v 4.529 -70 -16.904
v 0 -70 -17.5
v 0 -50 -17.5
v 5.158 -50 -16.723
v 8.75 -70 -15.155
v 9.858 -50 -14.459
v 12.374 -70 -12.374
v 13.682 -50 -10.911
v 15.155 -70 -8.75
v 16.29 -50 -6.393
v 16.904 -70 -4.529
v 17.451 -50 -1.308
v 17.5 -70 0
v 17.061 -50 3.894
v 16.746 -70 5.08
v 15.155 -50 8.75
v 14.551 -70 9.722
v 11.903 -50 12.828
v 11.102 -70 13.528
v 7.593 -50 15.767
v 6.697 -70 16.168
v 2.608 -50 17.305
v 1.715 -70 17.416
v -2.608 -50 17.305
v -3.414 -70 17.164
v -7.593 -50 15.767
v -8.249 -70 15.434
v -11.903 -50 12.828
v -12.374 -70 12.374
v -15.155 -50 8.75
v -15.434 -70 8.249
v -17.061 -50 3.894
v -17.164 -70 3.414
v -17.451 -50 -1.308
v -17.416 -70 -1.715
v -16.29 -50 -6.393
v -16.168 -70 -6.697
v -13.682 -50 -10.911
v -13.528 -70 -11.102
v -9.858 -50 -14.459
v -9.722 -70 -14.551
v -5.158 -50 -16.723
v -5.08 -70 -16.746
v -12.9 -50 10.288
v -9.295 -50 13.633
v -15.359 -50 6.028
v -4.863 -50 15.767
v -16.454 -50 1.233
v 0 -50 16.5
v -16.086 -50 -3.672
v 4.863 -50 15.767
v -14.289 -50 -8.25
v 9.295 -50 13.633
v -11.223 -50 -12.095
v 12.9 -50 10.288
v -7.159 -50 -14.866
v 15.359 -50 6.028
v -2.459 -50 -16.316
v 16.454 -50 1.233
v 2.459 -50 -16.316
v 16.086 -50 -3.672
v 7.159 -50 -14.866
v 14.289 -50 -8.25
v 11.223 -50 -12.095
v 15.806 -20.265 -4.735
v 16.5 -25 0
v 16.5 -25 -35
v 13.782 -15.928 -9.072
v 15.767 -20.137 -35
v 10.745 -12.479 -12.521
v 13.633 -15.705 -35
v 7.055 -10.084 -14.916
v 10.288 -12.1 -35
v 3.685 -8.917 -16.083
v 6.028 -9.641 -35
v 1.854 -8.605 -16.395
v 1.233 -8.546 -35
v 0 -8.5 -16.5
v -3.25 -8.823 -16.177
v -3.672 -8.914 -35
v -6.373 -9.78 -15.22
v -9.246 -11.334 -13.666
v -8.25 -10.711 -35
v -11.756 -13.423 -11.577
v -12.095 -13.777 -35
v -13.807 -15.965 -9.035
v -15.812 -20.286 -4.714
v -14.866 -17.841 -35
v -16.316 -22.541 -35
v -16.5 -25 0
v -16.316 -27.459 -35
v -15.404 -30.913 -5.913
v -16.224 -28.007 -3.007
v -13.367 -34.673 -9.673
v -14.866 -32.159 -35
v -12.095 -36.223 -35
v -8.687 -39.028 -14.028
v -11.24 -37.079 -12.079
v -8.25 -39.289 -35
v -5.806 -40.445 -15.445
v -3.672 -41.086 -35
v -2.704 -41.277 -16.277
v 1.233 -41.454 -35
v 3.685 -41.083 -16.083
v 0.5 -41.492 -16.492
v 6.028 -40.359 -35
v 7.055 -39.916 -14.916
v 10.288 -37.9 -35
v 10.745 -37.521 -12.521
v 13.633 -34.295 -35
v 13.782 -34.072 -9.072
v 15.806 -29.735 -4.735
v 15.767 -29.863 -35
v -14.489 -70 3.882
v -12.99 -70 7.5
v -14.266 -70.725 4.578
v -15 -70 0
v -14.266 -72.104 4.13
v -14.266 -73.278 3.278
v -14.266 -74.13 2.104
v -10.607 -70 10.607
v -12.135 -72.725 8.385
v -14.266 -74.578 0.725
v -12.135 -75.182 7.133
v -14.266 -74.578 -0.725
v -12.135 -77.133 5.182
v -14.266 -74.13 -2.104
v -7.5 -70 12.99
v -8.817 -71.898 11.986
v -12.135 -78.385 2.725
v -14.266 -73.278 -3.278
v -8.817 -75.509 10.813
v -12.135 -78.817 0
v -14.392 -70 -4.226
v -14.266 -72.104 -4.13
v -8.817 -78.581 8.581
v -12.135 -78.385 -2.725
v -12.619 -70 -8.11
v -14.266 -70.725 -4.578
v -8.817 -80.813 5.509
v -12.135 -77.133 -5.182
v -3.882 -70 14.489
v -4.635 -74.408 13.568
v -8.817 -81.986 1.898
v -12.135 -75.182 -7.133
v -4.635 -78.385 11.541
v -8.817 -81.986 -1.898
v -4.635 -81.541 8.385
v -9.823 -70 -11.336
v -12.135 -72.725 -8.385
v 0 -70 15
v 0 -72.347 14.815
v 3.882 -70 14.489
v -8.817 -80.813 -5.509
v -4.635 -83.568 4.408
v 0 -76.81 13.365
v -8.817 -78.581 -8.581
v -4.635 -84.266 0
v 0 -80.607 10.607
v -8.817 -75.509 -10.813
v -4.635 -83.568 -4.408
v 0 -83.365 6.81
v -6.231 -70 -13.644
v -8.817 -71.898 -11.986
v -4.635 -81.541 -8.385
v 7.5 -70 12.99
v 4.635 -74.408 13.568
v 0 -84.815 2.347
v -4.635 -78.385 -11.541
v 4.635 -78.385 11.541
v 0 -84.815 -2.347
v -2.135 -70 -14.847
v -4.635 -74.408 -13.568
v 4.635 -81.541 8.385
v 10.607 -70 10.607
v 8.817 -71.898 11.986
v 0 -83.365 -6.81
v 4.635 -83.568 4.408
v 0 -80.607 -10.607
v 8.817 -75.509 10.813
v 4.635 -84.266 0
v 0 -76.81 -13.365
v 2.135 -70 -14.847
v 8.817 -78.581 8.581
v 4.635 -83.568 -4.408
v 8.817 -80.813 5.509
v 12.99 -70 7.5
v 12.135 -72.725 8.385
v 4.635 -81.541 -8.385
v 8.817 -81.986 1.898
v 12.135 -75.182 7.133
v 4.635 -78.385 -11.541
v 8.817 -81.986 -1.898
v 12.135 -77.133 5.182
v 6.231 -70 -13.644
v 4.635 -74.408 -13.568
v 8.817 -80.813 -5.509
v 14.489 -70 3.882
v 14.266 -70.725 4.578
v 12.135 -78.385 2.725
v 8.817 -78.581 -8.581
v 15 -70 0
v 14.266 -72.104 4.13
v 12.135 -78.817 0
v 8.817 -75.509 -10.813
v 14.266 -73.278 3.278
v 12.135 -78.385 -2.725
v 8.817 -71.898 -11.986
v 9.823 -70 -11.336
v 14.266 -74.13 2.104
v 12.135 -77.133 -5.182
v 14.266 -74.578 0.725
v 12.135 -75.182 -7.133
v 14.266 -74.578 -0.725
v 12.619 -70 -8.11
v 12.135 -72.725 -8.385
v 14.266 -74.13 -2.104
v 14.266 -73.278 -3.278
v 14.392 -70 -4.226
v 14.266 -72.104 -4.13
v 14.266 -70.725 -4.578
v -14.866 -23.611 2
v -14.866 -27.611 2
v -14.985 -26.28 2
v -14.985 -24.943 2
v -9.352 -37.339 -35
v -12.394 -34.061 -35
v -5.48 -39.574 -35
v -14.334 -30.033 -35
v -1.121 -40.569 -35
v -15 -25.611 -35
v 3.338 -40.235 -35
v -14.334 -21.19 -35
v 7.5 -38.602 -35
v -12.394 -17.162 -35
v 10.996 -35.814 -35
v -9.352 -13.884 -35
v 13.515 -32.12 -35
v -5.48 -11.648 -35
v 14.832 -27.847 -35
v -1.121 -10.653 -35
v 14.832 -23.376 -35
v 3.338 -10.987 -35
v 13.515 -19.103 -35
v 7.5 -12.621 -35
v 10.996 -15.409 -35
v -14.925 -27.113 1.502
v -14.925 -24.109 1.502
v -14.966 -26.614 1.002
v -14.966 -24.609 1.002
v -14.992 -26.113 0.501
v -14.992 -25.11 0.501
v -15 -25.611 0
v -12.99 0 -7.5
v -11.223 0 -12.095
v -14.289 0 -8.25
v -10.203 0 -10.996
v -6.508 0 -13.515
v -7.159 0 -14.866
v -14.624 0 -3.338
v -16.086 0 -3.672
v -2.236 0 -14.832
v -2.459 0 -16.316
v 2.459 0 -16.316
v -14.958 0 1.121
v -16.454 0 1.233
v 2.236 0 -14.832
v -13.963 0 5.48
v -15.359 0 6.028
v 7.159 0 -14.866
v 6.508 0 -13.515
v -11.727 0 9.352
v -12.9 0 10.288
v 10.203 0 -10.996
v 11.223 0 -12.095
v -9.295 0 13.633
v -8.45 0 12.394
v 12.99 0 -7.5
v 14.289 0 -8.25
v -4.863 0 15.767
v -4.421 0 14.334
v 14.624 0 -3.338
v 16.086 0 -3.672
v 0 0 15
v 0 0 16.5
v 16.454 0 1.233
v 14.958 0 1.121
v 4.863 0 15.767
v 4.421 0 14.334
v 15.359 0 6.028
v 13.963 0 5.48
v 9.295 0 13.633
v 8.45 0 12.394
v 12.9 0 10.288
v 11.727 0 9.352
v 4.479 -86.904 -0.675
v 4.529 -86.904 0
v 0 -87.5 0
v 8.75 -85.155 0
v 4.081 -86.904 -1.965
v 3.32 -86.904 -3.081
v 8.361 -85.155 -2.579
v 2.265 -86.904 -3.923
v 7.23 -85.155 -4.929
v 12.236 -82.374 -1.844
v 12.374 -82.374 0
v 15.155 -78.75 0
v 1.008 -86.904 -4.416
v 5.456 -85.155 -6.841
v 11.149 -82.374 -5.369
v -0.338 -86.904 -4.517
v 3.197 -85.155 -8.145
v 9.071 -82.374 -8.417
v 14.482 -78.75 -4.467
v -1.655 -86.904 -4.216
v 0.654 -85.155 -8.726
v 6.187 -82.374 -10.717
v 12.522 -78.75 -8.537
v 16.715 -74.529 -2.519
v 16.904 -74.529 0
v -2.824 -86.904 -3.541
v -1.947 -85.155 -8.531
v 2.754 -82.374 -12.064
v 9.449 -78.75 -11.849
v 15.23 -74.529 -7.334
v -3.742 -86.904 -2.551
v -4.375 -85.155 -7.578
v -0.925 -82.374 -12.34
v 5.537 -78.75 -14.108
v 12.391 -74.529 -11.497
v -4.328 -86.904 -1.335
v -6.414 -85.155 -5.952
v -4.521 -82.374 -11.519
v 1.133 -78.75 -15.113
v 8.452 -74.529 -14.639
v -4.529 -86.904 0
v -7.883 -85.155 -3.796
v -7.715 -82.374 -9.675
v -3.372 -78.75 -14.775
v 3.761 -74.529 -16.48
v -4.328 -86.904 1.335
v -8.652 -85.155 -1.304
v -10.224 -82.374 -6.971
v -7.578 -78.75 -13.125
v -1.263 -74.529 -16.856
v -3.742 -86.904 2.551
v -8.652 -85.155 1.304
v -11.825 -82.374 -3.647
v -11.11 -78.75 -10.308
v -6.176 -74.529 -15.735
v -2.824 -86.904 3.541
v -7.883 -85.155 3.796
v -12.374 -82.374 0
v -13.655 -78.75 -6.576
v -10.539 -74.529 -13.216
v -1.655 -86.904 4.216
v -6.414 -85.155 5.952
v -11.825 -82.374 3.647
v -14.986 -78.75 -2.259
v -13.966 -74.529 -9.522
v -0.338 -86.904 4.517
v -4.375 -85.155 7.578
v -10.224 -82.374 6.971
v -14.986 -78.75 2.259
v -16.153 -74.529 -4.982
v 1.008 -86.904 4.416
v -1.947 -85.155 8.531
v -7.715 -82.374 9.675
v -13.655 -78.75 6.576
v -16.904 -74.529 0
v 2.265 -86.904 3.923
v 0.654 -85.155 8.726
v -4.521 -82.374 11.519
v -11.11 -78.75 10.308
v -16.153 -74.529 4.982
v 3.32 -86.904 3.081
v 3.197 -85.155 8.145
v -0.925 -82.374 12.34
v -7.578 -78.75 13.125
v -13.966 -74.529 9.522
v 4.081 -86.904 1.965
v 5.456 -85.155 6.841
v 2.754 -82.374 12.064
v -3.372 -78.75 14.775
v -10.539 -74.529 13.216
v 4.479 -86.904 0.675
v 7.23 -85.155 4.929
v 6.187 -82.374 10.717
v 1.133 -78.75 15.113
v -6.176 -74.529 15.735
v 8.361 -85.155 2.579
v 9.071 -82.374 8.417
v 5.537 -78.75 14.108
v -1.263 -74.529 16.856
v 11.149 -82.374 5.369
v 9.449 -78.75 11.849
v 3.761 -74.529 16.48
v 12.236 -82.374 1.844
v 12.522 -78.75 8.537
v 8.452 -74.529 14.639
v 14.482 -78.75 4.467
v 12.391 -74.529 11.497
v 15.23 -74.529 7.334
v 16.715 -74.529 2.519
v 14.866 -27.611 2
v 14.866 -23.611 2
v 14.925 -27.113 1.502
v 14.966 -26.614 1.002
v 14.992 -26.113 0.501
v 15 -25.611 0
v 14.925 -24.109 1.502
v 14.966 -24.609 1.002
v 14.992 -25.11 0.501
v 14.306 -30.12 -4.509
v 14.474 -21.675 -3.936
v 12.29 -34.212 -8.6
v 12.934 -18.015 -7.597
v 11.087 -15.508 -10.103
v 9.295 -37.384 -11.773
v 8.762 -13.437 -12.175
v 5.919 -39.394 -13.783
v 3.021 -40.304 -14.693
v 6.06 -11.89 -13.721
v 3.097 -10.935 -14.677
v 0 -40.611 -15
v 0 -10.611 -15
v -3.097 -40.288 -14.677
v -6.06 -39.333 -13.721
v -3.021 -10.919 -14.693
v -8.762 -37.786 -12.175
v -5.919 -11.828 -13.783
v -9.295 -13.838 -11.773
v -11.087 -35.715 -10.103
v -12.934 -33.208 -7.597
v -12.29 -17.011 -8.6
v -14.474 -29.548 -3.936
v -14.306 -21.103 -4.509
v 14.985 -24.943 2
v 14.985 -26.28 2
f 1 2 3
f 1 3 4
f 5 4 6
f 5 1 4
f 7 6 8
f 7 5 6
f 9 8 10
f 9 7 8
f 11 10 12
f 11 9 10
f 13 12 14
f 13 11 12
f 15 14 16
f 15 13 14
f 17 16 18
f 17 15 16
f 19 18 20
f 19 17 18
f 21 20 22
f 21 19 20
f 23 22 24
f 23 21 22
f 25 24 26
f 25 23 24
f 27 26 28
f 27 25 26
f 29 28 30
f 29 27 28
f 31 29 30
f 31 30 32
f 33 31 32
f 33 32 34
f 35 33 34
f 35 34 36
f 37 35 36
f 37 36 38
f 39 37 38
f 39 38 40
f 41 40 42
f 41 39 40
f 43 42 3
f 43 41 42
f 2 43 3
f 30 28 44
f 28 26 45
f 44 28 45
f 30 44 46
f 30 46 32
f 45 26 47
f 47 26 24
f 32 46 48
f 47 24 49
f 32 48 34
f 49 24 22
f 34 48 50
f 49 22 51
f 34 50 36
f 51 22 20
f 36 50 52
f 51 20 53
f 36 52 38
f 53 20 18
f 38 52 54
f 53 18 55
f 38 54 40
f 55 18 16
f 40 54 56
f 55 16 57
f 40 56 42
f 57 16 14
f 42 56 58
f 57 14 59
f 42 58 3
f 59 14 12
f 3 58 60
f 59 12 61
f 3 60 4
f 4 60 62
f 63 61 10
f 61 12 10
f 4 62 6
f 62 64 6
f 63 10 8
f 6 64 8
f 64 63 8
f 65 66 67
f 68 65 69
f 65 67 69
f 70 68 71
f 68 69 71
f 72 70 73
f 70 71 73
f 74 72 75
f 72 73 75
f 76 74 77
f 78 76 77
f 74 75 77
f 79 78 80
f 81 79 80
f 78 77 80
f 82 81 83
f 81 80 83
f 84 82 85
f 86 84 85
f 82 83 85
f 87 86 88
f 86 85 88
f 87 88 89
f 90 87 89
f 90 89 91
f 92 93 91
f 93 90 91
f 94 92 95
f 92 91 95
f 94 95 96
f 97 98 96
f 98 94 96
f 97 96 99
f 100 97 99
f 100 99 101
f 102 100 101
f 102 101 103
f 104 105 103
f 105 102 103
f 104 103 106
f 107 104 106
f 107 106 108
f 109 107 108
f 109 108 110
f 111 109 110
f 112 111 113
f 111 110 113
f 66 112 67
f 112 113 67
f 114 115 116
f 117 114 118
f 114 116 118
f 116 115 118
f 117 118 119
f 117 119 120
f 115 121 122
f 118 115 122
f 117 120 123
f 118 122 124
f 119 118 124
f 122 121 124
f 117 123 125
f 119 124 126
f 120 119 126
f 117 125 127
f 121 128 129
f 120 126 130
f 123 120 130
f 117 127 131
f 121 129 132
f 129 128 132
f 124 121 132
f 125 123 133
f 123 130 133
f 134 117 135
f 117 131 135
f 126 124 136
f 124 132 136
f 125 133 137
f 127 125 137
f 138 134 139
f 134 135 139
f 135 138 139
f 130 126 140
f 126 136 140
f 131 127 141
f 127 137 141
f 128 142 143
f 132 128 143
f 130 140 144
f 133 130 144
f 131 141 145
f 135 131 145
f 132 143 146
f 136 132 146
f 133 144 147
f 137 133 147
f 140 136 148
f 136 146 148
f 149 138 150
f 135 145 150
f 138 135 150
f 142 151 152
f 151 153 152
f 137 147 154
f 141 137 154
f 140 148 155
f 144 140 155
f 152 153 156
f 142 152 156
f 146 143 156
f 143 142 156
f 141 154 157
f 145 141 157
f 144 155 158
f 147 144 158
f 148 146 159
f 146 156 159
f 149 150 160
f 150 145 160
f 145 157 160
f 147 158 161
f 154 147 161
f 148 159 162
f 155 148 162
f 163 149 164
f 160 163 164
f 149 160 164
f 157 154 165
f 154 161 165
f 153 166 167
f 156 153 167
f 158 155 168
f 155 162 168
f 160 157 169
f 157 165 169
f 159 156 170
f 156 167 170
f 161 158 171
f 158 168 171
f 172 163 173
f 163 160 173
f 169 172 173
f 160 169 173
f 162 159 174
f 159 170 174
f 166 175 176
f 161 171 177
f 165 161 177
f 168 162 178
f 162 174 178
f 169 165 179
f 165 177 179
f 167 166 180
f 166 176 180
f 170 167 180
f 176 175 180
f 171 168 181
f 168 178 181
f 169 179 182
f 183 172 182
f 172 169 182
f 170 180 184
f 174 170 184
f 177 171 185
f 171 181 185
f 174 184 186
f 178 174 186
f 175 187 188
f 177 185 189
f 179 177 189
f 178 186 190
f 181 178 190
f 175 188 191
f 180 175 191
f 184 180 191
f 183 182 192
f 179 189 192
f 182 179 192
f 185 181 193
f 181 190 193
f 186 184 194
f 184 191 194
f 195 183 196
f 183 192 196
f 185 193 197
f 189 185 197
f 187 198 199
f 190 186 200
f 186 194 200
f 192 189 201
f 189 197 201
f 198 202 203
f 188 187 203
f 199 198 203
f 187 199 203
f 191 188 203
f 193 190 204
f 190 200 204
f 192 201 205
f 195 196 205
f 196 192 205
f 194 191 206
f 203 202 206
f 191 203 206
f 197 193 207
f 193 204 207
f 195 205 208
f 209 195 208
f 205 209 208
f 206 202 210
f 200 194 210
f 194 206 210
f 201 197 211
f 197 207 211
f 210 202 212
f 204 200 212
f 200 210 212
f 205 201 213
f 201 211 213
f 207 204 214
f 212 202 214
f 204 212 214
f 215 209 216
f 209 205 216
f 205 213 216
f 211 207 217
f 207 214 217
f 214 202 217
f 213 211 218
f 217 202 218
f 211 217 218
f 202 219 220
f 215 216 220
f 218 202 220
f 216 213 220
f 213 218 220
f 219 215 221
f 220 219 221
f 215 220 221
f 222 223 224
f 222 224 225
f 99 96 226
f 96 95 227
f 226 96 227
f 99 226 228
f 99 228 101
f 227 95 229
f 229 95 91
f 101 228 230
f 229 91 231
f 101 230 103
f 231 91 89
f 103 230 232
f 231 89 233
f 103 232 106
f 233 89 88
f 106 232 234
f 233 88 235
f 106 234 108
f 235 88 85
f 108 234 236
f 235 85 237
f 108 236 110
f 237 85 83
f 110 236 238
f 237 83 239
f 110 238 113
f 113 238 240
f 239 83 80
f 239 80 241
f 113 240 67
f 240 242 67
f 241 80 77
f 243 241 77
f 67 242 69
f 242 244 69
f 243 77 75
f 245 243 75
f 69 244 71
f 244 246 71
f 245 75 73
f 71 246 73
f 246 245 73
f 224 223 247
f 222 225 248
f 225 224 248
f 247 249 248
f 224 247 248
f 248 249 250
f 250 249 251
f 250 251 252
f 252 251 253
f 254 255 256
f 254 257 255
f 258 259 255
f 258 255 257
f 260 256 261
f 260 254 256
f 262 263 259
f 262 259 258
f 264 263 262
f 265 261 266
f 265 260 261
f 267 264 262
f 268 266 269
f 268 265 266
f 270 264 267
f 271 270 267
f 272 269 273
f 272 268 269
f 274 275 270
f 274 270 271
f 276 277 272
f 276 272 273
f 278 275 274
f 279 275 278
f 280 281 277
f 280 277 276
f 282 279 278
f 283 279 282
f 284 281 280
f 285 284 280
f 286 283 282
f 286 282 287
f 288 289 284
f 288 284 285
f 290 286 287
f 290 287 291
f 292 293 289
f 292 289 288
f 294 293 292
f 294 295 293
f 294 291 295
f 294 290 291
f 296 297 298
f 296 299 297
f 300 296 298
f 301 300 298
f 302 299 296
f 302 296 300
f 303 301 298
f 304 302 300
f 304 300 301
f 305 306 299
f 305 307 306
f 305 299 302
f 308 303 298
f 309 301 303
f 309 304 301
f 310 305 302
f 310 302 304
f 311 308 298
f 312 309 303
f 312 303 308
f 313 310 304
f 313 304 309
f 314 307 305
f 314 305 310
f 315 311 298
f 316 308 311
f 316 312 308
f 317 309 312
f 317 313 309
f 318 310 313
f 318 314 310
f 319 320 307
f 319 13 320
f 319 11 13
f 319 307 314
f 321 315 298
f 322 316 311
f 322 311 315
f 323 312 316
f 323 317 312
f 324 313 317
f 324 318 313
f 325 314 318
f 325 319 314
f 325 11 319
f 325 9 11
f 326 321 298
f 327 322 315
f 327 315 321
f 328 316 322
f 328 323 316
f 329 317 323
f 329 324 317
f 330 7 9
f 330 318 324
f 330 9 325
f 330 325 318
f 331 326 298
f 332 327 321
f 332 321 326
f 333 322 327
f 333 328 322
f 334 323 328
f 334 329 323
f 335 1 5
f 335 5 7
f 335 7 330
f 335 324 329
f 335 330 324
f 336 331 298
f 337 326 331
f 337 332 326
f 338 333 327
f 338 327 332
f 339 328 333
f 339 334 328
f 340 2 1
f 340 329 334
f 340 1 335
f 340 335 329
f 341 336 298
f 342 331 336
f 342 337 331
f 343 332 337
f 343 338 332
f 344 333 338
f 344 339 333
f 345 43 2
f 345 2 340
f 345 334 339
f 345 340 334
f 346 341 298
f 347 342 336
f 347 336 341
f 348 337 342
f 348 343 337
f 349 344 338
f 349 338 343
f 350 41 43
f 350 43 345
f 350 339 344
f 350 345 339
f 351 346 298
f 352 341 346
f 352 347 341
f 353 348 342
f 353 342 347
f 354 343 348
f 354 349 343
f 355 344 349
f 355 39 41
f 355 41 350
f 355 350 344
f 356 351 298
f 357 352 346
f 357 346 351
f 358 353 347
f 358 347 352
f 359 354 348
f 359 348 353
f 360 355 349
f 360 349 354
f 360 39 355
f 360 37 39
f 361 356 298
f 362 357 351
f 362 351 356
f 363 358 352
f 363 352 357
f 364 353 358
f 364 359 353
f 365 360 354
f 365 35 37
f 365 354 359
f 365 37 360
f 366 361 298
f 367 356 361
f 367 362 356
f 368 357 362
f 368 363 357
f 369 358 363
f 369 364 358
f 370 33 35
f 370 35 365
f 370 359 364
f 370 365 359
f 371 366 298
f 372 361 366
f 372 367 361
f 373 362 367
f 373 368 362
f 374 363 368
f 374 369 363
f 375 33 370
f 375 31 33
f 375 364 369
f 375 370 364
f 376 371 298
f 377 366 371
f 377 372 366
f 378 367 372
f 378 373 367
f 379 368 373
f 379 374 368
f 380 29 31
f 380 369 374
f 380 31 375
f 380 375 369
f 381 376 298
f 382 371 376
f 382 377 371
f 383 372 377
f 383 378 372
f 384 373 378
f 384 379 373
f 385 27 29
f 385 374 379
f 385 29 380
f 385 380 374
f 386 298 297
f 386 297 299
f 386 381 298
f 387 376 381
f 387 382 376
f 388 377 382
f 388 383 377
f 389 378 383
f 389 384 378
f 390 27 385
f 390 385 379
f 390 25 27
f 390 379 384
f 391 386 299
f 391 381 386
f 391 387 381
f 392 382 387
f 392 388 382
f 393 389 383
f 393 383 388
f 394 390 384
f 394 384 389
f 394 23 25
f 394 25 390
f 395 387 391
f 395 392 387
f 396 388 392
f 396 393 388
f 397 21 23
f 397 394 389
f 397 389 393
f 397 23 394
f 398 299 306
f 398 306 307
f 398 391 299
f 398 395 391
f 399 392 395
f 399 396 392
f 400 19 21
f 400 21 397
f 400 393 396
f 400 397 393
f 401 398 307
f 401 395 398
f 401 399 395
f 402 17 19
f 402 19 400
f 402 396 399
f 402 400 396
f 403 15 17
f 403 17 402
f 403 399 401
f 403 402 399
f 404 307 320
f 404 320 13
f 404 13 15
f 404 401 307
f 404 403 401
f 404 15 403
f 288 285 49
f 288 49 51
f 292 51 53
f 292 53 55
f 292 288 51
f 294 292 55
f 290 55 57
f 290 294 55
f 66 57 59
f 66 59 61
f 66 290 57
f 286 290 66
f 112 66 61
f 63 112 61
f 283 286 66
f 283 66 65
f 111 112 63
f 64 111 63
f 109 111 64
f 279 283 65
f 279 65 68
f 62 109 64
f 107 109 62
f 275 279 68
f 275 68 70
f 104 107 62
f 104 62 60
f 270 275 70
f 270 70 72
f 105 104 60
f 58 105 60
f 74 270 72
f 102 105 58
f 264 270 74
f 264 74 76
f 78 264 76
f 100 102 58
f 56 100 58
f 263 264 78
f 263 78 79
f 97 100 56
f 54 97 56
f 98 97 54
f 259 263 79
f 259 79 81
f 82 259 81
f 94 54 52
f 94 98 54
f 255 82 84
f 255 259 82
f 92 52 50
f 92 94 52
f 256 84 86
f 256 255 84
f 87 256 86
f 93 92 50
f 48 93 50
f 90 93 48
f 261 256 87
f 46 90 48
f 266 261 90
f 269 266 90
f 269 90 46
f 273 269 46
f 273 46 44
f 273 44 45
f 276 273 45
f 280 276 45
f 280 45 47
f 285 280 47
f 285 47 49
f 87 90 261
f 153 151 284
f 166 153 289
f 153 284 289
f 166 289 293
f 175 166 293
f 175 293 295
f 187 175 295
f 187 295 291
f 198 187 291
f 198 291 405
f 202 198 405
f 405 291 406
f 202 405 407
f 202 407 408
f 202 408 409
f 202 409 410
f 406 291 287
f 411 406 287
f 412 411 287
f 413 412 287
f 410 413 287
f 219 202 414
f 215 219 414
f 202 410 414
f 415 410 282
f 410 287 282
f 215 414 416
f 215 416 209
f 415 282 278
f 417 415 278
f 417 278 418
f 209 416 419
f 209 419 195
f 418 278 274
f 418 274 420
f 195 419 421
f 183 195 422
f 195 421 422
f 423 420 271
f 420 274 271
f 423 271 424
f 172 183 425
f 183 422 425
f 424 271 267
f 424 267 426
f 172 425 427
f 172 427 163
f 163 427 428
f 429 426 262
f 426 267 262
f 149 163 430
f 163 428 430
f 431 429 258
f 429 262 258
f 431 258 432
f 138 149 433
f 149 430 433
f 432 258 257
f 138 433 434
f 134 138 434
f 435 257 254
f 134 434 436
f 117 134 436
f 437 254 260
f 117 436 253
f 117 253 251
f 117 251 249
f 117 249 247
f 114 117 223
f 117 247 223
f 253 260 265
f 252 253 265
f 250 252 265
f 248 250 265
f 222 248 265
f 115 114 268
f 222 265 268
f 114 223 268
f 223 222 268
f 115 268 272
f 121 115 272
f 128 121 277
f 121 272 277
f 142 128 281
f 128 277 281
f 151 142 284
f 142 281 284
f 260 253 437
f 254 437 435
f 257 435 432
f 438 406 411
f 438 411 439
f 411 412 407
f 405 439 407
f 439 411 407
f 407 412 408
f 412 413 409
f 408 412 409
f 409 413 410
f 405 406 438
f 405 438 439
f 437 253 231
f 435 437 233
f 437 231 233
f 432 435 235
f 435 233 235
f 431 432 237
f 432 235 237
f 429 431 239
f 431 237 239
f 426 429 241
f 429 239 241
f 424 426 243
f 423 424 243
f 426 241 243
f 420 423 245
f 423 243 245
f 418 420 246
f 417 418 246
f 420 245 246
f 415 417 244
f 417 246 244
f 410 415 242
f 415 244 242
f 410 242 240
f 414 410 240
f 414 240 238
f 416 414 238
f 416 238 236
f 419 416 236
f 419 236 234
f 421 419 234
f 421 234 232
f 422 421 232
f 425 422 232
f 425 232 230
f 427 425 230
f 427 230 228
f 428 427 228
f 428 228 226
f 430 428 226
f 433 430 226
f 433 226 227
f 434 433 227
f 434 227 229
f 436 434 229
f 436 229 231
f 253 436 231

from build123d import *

# Parameters (mm, degrees)
SKETCH1_R                = 15
BOSS_EXTRUDE1_DEPTH      = 70
SKETCH7_R                = 17.5
BOSS_EXTRUDE2_DEPTH      = 20
SKETCH8_R                = 16.5
SKETCH8_R_2              = 15
BOSS_EXTRUDE4_DEPTH      = 70
SKETCH10_R               = 15
CUT_EXTRUDE2_DEPTH       = 70
SKETCH24_R               = 15
CUT_EXTRUDE4_DEPTH       = 22
BOSS_EXTRUDE5_DEPTH      = 15
BOSS_EXTRUDE5_DEPTH_BACK = 20
SKETCH30_R               = 16.5
SKETCH31_R               = 15
CUT_EXTRUDE5_DEPTH       = 37
SKETCH32_R               = 15
CUT_EXTRUDE6_DEPTH       = 55


# Read off the part's stored shape, not the designer's step: Revolve1
with BuildPart() as part:
    # Sketch1 → Boss-Extrude1 (new body)
    with BuildSketch(Plane(origin=(0, 0, 0), x_dir=(1, 0, 0), z_dir=(0, 1, 0))):
        with Locations(Location((0, 0, 0), (0, 0, 270))):
            Circle(SKETCH1_R)
    extrude(amount=-BOSS_EXTRUDE1_DEPTH)

    # Sketch7 → Boss-Extrude2 (add)
    with BuildSketch(Plane.XZ.offset(70)):
        with Locations(Location((0, 0, 0), (0, 0, 270))):
            Circle(SKETCH7_R)
    extrude(amount=-BOSS_EXTRUDE2_DEPTH)

    # Sketch8 → Boss-Extrude4 (add)
    with BuildSketch(Plane(origin=(0, 0, 0), x_dir=(1, 0, 0), z_dir=(0, 1, 0))):
        with Locations(Location((0, 0, 0), (0, 0, 270))):
            Circle(SKETCH8_R)
        Circle(SKETCH8_R_2, mode=Mode.SUBTRACT)
    extrude(amount=-BOSS_EXTRUDE4_DEPTH)

    # Sketch10 → Cut-Extrude2 (cut)
    with BuildSketch(Plane(origin=(0, 0, 0), x_dir=(1, 0, 0), z_dir=(0, 1, 0))):
        with Locations(Location((0, 0, 0), (0, 0, 270))):
            Circle(SKETCH10_R)
    extrude(amount=-CUT_EXTRUDE2_DEPTH, mode=Mode.SUBTRACT)

    # Revolve1 outline → Revolve1 (revolve)
    with BuildSketch(Plane.XY):
        with BuildLine():
            Line((17.5, -69.999999983), (0, -69.999999992))
            Line((0, -69.999999992), (0, -87.5))
            ThreePointArc((0, -87.5), (12.374368677, -82.374368665), (17.5, -69.999999983))
        make_face()
    revolve(axis=Axis((0, 0, 0), (0, 1, 0)))

    # Sketch24 → Cut-Extrude4 (cut)
    with BuildSketch(Plane.XY):
        with Locations((0, -25)):
            Circle(SKETCH24_R)
    extrude(amount=-CUT_EXTRUDE4_DEPTH, mode=Mode.SUBTRACT)

    # Sketch28 → Cut-Revolve1 (revolve, cut)
    with BuildSketch(Plane.XY):
        with BuildLine():
            Line((15, -70), (-15, -70))
            ThreePointArc((-15, -70), (0, -85), (15, -70))
        make_face()
    revolve(axis=Axis((-15, -70, 0), (1, 0, 0)), mode=Mode.SUBTRACT)

    # Sketch30 → Boss-Extrude5 (add, two sides: drawn at the far end of the back side and taken through both)
    with BuildSketch(Plane.XY.offset(-15).offset(-BOSS_EXTRUDE5_DEPTH_BACK)):
        with Locations((0, -25)):
            Circle(SKETCH30_R)
    extrude(amount=BOSS_EXTRUDE5_DEPTH + BOSS_EXTRUDE5_DEPTH_BACK)

    # Sketch31 → Cut-Extrude5 (cut)
    with BuildSketch(Plane(origin=(0, 0, -35), x_dir=(-1, 0, 0), z_dir=(0, 0, -1))):
        with Locations((0, -25.611375347)):
            Circle(SKETCH31_R)
    extrude(amount=-CUT_EXTRUDE5_DEPTH, mode=Mode.SUBTRACT)

    # Sketch32 → Cut-Extrude6 (cut)
    with BuildSketch(Plane(origin=(0, 0, 0), x_dir=(1, 0, 0), z_dir=(0, 1, 0))):
        with Locations(Location((0, 0, 0), (0, 0, 270))):
            Circle(SKETCH32_R)
    extrude(amount=-CUT_EXTRUDE6_DEPTH, mode=Mode.SUBTRACT)


solid = part.part
